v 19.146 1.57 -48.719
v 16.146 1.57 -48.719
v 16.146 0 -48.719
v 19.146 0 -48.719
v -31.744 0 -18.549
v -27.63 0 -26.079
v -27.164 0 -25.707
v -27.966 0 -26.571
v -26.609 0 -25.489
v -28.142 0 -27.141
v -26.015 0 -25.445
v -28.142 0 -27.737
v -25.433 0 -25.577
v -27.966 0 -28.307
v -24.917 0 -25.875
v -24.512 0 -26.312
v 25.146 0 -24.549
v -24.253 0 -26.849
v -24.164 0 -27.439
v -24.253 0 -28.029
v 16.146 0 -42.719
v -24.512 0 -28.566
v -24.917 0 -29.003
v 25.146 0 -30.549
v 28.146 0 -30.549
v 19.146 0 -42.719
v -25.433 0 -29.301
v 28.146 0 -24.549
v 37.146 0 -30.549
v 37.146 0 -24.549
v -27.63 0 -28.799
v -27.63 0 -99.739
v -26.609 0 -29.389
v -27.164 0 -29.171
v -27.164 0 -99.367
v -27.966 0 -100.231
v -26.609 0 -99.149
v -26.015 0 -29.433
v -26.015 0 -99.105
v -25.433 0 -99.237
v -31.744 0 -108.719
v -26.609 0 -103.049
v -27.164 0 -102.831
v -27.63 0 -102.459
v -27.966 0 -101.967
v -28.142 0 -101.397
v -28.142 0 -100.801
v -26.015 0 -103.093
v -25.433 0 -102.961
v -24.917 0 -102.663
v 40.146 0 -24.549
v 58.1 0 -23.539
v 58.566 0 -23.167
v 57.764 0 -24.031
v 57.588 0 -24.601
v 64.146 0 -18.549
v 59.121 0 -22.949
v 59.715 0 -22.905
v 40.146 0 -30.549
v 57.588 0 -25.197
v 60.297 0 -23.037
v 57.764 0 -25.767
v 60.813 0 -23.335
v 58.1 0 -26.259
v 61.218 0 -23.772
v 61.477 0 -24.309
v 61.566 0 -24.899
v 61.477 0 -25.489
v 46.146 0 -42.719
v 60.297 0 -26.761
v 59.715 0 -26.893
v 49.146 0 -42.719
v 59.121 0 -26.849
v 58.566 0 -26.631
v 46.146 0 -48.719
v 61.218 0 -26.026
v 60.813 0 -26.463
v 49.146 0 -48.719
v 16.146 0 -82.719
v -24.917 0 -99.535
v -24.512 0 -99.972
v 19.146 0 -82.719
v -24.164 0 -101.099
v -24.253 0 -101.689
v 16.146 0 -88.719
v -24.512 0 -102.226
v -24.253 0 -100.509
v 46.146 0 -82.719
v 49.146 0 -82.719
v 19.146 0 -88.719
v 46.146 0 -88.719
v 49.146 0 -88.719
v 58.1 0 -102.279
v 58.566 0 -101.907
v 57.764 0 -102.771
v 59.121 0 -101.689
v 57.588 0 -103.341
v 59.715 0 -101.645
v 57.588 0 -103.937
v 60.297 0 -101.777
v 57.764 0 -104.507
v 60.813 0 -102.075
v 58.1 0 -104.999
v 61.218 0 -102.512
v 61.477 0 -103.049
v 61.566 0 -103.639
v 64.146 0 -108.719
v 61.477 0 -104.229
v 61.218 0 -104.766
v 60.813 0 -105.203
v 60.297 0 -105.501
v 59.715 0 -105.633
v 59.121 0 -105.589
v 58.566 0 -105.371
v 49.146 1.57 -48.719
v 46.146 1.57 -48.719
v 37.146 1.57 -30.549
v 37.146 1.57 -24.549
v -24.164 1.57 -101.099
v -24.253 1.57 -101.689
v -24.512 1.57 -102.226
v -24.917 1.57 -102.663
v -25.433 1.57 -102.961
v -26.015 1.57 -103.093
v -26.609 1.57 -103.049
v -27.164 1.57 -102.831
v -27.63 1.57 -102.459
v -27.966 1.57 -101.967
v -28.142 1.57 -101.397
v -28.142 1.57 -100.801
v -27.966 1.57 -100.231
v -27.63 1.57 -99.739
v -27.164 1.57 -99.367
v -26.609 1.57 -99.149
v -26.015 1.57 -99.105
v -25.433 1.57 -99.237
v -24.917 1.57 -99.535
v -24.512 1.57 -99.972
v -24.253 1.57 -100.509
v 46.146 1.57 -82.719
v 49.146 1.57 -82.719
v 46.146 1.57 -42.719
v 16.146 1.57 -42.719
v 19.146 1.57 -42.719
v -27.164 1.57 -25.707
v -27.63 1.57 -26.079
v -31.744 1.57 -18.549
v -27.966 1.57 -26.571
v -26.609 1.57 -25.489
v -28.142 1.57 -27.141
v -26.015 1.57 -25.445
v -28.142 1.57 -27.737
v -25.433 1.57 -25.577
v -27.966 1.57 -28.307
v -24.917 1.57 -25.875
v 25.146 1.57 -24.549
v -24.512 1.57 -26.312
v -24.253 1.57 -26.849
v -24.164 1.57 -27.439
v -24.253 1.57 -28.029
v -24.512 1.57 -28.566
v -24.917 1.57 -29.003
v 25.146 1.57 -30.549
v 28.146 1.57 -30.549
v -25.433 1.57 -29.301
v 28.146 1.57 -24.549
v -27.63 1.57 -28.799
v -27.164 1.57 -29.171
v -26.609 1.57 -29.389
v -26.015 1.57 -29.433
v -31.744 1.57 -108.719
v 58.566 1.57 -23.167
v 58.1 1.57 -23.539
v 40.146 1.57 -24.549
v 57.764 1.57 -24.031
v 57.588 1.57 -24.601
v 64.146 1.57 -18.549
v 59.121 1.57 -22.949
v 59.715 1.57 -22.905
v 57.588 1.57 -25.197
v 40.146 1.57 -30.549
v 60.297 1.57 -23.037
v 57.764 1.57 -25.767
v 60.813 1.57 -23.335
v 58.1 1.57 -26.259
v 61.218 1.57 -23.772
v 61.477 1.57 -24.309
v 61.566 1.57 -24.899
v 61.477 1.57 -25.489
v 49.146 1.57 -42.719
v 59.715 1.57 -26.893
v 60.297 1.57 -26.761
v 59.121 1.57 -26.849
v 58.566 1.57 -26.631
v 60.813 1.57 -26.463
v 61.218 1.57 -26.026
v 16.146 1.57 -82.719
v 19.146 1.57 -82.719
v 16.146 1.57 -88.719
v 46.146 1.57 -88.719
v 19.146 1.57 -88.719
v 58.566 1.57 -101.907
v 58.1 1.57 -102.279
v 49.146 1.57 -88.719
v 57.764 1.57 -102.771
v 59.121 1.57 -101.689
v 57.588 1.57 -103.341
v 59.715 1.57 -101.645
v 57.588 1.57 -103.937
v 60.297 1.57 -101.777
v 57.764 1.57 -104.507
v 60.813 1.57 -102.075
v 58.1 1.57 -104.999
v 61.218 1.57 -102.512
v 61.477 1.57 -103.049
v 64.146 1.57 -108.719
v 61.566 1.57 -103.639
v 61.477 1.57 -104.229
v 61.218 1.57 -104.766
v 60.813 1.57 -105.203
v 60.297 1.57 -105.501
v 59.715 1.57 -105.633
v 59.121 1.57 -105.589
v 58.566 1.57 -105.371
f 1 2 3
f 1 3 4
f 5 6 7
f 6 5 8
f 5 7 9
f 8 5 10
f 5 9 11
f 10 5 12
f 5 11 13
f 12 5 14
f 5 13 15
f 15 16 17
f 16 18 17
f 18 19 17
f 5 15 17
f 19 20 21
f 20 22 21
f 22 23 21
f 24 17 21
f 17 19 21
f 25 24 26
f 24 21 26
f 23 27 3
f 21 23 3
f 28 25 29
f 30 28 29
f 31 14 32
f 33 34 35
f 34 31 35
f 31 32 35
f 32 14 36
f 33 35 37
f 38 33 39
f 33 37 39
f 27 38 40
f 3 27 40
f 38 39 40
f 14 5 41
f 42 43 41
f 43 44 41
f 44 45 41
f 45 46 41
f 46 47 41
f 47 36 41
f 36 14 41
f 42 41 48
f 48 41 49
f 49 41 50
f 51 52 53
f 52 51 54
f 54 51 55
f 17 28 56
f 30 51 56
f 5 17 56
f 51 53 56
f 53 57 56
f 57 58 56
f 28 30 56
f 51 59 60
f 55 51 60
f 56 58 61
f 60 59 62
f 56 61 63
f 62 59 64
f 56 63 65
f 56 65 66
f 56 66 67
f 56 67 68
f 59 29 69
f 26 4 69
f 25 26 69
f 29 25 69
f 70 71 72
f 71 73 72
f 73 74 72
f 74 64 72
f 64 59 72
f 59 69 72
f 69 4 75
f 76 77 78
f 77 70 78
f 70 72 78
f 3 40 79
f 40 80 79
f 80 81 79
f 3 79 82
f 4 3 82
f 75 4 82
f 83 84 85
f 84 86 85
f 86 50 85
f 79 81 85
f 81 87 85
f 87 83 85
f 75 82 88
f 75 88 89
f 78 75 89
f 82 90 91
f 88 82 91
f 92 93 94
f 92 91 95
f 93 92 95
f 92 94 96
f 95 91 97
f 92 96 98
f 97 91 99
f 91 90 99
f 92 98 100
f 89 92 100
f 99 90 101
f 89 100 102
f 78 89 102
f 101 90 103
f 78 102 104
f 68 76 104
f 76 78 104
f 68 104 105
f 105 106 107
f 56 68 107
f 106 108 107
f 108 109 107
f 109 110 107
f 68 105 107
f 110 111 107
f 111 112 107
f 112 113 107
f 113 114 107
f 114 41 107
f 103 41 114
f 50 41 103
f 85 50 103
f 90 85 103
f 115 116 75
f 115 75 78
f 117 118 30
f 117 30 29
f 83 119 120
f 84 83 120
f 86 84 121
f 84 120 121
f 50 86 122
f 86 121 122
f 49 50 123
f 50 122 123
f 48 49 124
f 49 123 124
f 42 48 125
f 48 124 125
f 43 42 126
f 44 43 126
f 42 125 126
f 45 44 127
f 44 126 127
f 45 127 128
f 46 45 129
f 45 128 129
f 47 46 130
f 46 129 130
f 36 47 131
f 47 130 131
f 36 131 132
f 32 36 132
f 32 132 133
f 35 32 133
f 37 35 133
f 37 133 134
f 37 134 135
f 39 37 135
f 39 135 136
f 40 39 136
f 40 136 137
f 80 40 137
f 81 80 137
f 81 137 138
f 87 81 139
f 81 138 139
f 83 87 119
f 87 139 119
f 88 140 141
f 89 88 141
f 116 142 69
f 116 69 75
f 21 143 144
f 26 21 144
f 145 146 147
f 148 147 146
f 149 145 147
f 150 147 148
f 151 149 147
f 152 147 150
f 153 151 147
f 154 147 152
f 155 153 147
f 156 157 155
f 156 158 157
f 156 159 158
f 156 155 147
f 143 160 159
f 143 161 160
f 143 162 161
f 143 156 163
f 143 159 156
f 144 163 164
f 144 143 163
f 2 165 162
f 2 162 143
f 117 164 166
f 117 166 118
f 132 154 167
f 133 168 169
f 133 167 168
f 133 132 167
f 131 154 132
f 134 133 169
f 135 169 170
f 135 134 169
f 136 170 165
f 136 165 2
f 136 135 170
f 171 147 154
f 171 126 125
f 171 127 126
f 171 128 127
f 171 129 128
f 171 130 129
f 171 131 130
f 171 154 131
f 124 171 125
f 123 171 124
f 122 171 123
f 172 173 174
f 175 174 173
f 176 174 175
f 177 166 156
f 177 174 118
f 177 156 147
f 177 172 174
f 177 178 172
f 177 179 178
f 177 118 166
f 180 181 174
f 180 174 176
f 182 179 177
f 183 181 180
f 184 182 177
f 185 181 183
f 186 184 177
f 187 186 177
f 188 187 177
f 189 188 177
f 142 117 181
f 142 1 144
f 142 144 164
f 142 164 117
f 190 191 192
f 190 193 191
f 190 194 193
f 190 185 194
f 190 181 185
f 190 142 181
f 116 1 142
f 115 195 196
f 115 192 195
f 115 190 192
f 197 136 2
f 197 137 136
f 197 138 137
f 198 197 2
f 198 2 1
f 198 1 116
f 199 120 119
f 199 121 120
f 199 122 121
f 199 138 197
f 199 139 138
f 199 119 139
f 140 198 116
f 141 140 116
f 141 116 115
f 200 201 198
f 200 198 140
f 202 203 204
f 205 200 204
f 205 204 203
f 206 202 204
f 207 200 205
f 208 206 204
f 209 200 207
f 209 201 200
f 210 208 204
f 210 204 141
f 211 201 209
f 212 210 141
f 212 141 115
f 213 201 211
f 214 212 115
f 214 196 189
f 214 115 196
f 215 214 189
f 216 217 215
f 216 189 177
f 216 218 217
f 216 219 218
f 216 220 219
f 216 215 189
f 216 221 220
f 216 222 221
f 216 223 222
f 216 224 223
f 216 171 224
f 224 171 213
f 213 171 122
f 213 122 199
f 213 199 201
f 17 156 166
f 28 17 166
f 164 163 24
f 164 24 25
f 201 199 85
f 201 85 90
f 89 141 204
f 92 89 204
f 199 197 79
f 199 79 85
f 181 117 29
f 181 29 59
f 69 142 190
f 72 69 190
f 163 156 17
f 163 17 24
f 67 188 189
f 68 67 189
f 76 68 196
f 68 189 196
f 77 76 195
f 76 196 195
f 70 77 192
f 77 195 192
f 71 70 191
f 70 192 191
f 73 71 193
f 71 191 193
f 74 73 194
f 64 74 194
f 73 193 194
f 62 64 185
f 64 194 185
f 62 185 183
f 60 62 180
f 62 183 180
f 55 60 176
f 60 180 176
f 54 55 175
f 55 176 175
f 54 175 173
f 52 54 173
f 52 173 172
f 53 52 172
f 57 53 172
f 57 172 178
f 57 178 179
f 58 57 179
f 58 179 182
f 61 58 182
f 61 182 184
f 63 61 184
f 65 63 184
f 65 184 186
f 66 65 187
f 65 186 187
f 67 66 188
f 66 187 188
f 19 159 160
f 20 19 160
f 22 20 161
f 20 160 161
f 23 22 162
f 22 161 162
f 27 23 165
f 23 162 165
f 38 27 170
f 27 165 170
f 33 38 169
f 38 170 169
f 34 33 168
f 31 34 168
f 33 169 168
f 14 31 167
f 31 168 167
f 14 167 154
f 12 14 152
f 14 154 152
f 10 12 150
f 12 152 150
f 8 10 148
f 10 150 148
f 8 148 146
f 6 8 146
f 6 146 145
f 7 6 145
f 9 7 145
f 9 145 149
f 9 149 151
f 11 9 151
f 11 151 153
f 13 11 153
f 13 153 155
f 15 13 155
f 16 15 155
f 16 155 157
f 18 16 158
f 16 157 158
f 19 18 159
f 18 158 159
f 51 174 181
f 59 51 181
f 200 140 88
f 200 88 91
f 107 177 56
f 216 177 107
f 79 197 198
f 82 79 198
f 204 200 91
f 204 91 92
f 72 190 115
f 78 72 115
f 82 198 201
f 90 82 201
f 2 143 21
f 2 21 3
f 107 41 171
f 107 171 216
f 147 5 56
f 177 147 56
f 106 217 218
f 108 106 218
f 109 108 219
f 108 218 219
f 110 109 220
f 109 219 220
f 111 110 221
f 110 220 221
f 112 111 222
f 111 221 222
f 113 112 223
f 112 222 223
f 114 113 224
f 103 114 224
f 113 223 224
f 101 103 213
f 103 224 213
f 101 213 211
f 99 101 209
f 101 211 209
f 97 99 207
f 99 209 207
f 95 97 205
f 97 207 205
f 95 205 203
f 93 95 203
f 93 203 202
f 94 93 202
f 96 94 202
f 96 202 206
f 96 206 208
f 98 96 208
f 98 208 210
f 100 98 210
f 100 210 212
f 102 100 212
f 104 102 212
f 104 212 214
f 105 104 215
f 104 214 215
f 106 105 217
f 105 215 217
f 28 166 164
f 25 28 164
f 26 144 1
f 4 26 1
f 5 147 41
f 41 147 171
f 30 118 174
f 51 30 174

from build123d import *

# Parameters (mm, degrees)
SKETCH1_W               = 96.89
SKETCH1_H               = 90.17
PCB_DEPTH               = 1.57
SKETCH2_R               = 2
M3_MOUNTING_HOLES_DEPTH = 1.57
SKETCH5_W               = 0.5
SKETCH5_H               = 90.17
CUT_EXTRUDE1_DEPTH      = 2.57
SKETCH6_W               = 3
SKETCH6_H               = 6
ZIPTIE_HOLDS_DEPTH      = 10


with BuildPart() as part:
    # Sketch1 → PCB (new body)
    with BuildSketch(Plane(origin=(0, 0, 0), x_dir=(1, 0, 0), z_dir=(0, 1, 0))):
        with Locations((16.200949951, 63.633996534)):
            Rectangle(SKETCH1_W, SKETCH1_H)
    extrude(amount=PCB_DEPTH)

    # Sketch2 → M3 Mounting Holes (cut)
    with BuildSketch(Plane(origin=(0, 1.57, 0), x_dir=(1, 0, 0), z_dir=(0, 1, 0))):
        with Locations((59.565949951, 24.898996534)):
            Circle(SKETCH2_R)
        with Locations((-26.164050049, 27.438996534)):
            Circle(SKETCH2_R)
        with Locations((-26.164050049, 101.098996534)):
            Circle(SKETCH2_R)
        with Locations((59.565949951, 103.638996534)):
            Circle(SKETCH2_R)
    extrude(amount=-M3_MOUNTING_HOLES_DEPTH, mode=Mode.SUBTRACT)

    # Sketch5 → Cut-Extrude1 (cut, through all)
    with BuildSketch(Plane(origin=(0, 1.57, 0), x_dir=(1, 0, 0), z_dir=(0, 1, 0))):
        with Locations((-31.994050049, 63.633996534)):
            Rectangle(SKETCH5_W, SKETCH5_H)
        with Locations((64.395949951, 63.633996534)):
            Rectangle(SKETCH5_W, SKETCH5_H)
    extrude(amount=-CUT_EXTRUDE1_DEPTH, mode=Mode.SUBTRACT)

    # Sketch6 → ZipTie Holds (cut)
    with BuildSketch(Plane(origin=(0, 1.57, 0), x_dir=(1, 0, 0), z_dir=(0, 1, 0))):
        with Locations((17.645949951, 85.718996534)):
            Rectangle(SKETCH6_W, SKETCH6_H)
        with Locations((47.645949951, 85.718996534)):
            Rectangle(SKETCH6_W, SKETCH6_H)
        with Locations((17.645949951, 45.718996534)):
            Rectangle(SKETCH6_W, SKETCH6_H)
        with Locations((47.645949951, 45.718996534)):
            Rectangle(SKETCH6_W, SKETCH6_H)
        with Locations((26.645949951, 27.548996534)):
            Rectangle(SKETCH6_W, SKETCH6_H)
        with Locations((38.645949951, 27.548996534)):
            Rectangle(SKETCH6_W, SKETCH6_H)
    extrude(amount=-ZIPTIE_HOLDS_DEPTH, mode=Mode.SUBTRACT)


solid = part.part
